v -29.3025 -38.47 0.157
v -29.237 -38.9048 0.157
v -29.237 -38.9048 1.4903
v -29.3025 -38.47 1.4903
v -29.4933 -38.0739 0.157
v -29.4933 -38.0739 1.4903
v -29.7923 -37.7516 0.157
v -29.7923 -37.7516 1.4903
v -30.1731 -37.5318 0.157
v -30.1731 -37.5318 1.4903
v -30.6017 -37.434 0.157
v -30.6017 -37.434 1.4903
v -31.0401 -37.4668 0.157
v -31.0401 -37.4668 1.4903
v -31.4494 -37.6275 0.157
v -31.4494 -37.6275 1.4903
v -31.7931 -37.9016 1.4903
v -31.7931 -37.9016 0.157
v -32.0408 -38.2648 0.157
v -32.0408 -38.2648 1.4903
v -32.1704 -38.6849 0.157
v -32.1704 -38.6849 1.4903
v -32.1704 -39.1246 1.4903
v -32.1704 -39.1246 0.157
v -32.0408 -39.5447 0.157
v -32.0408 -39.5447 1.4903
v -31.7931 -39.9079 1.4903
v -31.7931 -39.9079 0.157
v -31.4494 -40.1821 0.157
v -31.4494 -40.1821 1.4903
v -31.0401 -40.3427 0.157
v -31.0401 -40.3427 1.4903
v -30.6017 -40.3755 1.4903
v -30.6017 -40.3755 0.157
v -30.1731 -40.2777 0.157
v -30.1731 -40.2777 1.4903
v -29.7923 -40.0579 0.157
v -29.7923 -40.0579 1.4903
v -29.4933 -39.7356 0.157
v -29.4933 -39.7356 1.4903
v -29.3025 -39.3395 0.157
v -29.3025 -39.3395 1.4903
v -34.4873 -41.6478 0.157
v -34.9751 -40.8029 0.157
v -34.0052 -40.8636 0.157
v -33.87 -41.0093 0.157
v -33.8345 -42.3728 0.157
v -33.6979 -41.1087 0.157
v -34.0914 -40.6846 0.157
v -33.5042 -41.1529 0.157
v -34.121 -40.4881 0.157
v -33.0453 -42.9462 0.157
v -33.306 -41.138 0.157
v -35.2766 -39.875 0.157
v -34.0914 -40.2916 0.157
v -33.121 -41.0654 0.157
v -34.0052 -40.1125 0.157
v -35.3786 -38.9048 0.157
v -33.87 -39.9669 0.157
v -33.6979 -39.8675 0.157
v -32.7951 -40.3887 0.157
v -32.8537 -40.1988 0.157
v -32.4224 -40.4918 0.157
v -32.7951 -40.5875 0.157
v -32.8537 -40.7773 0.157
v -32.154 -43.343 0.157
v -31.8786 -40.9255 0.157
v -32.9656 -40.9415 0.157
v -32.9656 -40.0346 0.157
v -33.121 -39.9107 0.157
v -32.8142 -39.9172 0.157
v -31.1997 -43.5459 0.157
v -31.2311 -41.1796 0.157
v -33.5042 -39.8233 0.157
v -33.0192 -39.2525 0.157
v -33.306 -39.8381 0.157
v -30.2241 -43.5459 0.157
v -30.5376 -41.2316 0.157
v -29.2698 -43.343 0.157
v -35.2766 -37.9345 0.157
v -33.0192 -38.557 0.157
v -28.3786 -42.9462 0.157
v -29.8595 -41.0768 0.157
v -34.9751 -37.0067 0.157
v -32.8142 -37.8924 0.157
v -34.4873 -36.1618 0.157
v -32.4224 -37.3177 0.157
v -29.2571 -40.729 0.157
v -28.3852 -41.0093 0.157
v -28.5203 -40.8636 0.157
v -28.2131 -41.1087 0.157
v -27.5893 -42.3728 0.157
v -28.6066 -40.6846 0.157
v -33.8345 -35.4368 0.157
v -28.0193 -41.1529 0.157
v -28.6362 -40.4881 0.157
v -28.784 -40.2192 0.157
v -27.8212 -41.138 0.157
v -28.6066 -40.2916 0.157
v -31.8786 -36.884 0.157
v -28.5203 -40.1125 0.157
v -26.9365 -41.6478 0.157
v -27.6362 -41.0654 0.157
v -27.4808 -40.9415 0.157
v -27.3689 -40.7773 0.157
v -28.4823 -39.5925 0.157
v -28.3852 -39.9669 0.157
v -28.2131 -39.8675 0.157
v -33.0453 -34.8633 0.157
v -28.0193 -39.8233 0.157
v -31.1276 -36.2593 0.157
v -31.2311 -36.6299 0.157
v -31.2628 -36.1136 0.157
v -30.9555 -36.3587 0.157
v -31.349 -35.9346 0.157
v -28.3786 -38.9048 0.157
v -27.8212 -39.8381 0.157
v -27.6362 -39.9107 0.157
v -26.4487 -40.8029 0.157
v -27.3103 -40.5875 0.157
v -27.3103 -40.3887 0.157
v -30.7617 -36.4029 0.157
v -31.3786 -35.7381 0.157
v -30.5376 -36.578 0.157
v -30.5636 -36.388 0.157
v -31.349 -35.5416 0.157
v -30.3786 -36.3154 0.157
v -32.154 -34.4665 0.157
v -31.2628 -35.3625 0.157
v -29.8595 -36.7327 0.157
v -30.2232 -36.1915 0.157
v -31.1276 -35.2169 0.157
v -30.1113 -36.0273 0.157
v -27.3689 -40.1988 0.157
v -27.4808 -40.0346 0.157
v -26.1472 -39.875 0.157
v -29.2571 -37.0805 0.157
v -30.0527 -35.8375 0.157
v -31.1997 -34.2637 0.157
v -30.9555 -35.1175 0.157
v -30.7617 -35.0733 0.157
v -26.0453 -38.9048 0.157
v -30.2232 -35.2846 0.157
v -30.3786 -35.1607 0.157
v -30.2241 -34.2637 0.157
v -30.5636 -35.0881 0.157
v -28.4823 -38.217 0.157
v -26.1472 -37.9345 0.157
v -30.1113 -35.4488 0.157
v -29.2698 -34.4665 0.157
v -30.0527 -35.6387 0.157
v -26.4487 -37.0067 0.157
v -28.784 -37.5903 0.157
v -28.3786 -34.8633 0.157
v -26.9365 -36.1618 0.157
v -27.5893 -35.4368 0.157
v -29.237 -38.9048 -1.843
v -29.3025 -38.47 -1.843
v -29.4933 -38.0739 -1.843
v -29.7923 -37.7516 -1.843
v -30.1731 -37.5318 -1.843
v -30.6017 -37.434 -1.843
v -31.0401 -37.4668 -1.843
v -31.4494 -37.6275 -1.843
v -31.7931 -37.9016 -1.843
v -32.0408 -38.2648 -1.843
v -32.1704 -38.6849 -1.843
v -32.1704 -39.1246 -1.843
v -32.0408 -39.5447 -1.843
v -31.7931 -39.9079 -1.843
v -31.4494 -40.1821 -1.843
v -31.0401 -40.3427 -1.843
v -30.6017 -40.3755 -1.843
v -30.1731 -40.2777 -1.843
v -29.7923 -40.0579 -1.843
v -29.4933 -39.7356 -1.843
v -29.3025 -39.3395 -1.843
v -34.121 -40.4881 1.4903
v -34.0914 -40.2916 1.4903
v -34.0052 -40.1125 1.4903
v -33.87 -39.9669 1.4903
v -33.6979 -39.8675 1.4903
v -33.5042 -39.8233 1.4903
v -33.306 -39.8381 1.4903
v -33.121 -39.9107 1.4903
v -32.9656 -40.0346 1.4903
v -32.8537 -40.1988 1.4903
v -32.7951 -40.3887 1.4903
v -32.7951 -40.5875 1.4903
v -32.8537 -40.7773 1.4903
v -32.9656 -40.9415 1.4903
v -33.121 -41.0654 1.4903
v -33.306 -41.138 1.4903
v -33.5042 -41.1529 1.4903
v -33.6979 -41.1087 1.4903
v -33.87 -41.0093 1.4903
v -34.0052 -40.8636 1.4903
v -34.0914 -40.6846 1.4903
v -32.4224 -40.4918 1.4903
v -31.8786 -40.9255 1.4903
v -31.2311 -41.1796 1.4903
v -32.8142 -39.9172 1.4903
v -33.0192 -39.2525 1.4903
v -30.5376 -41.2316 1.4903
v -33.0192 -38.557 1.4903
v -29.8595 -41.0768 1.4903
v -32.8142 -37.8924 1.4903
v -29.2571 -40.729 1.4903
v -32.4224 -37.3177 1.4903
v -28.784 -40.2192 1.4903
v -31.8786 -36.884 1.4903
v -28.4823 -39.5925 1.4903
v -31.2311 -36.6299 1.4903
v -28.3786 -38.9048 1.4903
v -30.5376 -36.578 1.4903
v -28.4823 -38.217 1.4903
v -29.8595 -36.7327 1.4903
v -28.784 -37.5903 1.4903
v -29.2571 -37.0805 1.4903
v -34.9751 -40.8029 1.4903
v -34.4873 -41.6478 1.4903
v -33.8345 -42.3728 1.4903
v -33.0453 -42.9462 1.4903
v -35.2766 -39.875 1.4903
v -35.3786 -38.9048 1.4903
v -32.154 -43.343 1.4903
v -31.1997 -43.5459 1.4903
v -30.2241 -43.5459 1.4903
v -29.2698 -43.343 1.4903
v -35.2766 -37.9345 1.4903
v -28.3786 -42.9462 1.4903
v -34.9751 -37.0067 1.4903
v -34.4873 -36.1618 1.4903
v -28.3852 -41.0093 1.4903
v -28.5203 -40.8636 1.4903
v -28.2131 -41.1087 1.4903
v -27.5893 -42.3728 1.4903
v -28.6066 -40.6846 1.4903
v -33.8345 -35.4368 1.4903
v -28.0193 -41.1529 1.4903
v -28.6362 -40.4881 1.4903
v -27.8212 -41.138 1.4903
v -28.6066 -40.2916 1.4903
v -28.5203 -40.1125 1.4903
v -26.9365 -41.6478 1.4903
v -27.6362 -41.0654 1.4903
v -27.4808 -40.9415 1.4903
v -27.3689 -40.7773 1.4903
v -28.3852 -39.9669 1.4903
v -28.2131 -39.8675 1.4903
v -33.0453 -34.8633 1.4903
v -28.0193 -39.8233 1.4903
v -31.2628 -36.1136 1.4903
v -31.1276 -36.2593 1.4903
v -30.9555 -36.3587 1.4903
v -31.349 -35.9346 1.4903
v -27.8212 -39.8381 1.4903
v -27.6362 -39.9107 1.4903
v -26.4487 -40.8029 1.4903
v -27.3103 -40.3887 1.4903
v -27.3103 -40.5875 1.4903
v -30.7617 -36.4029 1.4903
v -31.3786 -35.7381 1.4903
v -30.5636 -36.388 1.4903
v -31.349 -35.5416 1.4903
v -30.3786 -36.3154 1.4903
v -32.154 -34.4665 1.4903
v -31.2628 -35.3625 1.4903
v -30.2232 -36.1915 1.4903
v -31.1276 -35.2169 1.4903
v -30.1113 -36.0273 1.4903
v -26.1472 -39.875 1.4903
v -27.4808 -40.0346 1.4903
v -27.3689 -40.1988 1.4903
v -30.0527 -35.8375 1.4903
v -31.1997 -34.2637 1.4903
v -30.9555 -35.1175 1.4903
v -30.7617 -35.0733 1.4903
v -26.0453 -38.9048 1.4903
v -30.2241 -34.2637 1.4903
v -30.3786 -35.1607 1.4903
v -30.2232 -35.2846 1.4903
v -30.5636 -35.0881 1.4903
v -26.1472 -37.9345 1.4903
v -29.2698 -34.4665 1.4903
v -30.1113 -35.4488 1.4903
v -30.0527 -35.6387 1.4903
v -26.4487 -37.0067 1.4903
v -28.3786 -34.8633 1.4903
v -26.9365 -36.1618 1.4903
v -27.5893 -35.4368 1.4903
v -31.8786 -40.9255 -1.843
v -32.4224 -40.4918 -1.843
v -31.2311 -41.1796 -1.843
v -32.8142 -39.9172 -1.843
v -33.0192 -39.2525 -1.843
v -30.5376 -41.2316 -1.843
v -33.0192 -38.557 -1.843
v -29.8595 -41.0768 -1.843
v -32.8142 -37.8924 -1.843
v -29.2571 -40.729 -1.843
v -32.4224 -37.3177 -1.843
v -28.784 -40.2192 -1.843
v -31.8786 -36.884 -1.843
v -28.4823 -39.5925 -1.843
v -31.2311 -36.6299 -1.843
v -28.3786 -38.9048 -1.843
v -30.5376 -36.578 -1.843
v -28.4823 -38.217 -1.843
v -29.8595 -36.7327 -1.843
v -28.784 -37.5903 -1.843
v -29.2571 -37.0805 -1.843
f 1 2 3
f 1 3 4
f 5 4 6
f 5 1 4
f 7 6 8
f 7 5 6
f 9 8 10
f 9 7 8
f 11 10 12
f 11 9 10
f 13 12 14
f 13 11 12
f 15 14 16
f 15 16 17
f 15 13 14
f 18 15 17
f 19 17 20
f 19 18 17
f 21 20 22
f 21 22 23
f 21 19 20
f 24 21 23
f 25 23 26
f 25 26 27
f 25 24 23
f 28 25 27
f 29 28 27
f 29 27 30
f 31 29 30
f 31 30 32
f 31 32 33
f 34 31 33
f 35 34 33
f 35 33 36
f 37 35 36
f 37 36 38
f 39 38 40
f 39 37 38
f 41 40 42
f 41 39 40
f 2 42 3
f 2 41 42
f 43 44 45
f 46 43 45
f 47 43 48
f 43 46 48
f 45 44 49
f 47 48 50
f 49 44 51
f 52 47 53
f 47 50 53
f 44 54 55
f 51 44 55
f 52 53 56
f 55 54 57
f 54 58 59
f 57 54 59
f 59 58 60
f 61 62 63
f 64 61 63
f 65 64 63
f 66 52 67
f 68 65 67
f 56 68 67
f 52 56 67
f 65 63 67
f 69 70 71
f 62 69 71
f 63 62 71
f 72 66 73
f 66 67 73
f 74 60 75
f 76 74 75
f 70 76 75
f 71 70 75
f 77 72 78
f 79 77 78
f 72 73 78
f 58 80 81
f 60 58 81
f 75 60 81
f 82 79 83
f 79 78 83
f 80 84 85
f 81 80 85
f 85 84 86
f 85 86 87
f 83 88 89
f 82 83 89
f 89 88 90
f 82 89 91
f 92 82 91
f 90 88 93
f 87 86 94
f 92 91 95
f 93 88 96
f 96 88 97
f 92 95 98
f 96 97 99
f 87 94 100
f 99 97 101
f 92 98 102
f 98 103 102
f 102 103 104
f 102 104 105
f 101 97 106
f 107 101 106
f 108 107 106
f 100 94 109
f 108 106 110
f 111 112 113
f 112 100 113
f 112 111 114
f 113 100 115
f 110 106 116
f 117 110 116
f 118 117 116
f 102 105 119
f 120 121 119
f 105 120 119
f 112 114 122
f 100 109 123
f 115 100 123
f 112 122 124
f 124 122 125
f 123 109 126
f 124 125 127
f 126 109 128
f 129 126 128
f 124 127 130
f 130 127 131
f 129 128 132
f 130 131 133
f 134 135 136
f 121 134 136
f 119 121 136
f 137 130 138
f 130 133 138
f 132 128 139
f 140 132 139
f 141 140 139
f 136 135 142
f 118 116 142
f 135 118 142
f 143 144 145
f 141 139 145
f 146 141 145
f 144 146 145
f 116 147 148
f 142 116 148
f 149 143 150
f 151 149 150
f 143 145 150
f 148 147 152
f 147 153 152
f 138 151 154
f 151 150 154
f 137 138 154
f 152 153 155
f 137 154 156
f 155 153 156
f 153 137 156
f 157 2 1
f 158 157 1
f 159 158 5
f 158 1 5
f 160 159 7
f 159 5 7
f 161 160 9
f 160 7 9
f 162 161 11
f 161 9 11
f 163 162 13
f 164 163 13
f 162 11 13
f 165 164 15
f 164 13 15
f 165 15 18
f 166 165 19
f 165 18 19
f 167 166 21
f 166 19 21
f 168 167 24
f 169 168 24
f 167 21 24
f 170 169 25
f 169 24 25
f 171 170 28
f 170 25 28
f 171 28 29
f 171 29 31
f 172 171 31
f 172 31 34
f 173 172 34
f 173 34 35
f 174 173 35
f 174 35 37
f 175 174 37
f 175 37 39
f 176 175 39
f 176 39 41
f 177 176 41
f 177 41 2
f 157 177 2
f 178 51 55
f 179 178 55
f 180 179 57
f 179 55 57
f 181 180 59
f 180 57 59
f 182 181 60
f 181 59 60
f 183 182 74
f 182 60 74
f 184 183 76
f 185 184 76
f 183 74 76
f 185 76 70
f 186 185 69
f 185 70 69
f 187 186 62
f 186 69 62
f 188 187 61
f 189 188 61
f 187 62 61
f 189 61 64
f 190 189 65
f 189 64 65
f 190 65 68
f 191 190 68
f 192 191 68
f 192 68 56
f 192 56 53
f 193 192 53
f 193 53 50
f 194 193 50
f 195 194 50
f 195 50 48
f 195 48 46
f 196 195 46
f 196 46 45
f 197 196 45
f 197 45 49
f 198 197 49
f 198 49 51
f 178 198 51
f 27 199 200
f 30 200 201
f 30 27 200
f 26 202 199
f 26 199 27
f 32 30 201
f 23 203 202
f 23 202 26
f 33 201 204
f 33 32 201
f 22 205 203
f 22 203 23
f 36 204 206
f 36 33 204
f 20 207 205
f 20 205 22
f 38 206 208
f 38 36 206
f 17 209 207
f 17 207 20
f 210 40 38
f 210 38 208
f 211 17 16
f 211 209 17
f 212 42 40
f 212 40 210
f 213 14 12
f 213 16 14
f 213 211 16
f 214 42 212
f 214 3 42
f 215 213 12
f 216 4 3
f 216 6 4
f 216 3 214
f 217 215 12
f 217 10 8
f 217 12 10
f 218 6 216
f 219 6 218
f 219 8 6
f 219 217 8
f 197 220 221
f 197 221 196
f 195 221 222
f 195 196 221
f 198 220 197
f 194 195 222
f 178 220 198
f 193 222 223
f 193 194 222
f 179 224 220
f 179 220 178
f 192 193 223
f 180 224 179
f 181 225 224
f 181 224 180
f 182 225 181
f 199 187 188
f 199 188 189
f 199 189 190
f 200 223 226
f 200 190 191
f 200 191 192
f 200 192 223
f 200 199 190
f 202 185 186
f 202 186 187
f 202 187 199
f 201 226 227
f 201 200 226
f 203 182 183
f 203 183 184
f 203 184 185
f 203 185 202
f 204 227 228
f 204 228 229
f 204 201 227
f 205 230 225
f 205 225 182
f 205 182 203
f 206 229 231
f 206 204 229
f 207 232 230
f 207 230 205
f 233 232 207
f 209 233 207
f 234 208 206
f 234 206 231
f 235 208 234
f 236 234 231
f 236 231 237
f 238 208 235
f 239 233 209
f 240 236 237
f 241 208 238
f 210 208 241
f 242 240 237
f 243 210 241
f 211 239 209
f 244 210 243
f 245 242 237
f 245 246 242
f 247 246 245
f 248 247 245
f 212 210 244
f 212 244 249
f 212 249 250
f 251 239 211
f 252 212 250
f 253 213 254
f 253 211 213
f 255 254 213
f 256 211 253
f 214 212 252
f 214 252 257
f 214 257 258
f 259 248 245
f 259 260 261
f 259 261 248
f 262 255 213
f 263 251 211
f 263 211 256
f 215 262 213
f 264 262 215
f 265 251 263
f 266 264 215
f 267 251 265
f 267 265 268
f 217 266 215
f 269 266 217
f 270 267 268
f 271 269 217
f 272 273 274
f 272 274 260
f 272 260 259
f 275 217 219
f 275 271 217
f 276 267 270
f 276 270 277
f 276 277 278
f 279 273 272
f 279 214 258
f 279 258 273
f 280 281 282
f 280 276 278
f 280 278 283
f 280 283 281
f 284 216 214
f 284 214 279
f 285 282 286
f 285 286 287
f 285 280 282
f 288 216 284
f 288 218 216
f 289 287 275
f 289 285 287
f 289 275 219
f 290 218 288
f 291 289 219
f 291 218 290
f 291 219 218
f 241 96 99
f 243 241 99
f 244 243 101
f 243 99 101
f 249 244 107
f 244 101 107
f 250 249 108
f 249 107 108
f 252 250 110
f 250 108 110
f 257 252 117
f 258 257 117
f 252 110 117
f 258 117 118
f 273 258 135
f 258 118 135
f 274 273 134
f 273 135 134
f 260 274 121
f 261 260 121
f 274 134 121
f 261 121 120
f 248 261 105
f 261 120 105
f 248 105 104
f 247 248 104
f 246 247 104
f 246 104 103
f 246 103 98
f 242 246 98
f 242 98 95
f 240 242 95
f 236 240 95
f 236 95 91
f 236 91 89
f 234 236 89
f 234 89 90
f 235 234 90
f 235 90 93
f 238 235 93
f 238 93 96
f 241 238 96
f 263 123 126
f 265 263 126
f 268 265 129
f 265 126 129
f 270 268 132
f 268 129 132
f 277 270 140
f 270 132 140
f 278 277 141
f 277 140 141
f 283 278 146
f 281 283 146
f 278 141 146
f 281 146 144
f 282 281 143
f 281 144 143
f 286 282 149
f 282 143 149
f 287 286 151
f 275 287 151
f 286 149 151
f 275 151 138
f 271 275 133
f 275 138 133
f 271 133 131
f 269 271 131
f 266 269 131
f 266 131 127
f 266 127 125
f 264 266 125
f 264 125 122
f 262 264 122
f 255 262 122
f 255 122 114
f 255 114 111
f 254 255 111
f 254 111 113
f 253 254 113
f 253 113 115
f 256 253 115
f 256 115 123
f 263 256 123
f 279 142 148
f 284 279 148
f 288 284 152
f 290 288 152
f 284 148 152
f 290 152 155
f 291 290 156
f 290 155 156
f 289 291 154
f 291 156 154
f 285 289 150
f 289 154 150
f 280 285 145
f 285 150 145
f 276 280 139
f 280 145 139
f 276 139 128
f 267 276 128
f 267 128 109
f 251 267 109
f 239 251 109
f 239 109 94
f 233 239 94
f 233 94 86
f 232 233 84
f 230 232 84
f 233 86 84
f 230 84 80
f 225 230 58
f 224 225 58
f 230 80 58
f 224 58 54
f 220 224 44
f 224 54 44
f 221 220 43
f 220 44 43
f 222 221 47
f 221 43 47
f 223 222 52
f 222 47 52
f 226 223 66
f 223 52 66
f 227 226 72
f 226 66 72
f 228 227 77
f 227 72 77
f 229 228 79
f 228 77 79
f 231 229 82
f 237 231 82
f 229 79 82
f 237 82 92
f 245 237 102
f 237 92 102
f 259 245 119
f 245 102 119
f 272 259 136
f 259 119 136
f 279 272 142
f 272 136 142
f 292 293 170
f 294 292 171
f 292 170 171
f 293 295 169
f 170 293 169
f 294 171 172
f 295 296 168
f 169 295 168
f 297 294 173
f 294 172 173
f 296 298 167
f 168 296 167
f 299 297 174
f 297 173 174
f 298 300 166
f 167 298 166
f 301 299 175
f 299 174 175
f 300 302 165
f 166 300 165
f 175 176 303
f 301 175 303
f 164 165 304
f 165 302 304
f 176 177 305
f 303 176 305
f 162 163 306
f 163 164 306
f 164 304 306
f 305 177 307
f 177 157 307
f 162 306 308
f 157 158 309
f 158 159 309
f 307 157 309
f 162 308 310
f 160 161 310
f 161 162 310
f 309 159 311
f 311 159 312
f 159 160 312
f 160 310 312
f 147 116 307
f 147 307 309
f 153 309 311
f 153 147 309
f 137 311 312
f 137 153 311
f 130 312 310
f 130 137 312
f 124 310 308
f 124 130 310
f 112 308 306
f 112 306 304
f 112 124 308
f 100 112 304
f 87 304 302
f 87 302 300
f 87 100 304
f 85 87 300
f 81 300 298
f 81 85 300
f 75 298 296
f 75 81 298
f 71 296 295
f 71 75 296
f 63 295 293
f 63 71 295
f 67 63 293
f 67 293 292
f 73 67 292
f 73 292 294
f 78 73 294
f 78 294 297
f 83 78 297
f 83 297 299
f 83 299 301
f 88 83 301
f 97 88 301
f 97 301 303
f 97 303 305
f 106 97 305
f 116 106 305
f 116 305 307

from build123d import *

# Parameters (mm, degrees)
IZIM1_R                     = 7
IZIM1_R_2                   = 2.212355073
Y_KSEKLIK_EKSTR_ZYON1_DEPTH = 2
IZIM2_R                     = 3.5
IZIM2_R_2                   = 2.212355073
Y_KSEKLIK_EKSTR_ZYON2_DEPTH = 5
IZIM3_R                     = 1
KES_EKSTR_ZYON1_DEPTH       = 5
SCALE1_SCALE                = 0.666666667


with BuildPart() as part:
    # Çizim1 → Yükseklik-Ekstrüzyon1 (new body)
    with BuildSketch(Plane.XY):
        with Locations((-30.711927379, -38.904760786)):
            Circle(IZIM1_R)
        with Locations((-30.711927379, -38.904760786)):
            Circle(IZIM1_R_2, mode=Mode.SUBTRACT)
    extrude(amount=Y_KSEKLIK_EKSTR_ZYON1_DEPTH)

    # Çizim2 → Yükseklik-Ekstrüzyon2 (add)
    with BuildSketch(Plane.XY.offset(2)):
        with Locations((-30.711927379, -38.904760786)):
            Circle(IZIM2_R)
        with Locations((-30.711927379, -38.904760786)):
            Circle(IZIM2_R_2, mode=Mode.SUBTRACT)
    extrude(amount=-Y_KSEKLIK_EKSTR_ZYON2_DEPTH)

    # Çizim3 → Kes-Ekstrüzyon1 (cut)
    with BuildSketch(Plane(origin=(0, 0, 0), x_dir=(-1, 0, 0), z_dir=(0, 0, -1))):
        with Locations((30.711927379, -34.154760786)):
            Circle(IZIM3_R)
        with Locations((34.825548047, -41.279760786)):
            Circle(IZIM3_R)
        with Locations((26.598306711, -41.279760786)):
            Circle(IZIM3_R)
    extrude(amount=-KES_EKSTR_ZYON1_DEPTH, mode=Mode.SUBTRACT)


with BuildPart() as part_1:
    # Scale1: scaled about (-30.711927379, -38.904760786, 0.470967588)
    add(part.part.scale(SCALE1_SCALE).moved(Location((-10.237309126, -12.968253595, 0.156989196))))


solid = part_1.part
